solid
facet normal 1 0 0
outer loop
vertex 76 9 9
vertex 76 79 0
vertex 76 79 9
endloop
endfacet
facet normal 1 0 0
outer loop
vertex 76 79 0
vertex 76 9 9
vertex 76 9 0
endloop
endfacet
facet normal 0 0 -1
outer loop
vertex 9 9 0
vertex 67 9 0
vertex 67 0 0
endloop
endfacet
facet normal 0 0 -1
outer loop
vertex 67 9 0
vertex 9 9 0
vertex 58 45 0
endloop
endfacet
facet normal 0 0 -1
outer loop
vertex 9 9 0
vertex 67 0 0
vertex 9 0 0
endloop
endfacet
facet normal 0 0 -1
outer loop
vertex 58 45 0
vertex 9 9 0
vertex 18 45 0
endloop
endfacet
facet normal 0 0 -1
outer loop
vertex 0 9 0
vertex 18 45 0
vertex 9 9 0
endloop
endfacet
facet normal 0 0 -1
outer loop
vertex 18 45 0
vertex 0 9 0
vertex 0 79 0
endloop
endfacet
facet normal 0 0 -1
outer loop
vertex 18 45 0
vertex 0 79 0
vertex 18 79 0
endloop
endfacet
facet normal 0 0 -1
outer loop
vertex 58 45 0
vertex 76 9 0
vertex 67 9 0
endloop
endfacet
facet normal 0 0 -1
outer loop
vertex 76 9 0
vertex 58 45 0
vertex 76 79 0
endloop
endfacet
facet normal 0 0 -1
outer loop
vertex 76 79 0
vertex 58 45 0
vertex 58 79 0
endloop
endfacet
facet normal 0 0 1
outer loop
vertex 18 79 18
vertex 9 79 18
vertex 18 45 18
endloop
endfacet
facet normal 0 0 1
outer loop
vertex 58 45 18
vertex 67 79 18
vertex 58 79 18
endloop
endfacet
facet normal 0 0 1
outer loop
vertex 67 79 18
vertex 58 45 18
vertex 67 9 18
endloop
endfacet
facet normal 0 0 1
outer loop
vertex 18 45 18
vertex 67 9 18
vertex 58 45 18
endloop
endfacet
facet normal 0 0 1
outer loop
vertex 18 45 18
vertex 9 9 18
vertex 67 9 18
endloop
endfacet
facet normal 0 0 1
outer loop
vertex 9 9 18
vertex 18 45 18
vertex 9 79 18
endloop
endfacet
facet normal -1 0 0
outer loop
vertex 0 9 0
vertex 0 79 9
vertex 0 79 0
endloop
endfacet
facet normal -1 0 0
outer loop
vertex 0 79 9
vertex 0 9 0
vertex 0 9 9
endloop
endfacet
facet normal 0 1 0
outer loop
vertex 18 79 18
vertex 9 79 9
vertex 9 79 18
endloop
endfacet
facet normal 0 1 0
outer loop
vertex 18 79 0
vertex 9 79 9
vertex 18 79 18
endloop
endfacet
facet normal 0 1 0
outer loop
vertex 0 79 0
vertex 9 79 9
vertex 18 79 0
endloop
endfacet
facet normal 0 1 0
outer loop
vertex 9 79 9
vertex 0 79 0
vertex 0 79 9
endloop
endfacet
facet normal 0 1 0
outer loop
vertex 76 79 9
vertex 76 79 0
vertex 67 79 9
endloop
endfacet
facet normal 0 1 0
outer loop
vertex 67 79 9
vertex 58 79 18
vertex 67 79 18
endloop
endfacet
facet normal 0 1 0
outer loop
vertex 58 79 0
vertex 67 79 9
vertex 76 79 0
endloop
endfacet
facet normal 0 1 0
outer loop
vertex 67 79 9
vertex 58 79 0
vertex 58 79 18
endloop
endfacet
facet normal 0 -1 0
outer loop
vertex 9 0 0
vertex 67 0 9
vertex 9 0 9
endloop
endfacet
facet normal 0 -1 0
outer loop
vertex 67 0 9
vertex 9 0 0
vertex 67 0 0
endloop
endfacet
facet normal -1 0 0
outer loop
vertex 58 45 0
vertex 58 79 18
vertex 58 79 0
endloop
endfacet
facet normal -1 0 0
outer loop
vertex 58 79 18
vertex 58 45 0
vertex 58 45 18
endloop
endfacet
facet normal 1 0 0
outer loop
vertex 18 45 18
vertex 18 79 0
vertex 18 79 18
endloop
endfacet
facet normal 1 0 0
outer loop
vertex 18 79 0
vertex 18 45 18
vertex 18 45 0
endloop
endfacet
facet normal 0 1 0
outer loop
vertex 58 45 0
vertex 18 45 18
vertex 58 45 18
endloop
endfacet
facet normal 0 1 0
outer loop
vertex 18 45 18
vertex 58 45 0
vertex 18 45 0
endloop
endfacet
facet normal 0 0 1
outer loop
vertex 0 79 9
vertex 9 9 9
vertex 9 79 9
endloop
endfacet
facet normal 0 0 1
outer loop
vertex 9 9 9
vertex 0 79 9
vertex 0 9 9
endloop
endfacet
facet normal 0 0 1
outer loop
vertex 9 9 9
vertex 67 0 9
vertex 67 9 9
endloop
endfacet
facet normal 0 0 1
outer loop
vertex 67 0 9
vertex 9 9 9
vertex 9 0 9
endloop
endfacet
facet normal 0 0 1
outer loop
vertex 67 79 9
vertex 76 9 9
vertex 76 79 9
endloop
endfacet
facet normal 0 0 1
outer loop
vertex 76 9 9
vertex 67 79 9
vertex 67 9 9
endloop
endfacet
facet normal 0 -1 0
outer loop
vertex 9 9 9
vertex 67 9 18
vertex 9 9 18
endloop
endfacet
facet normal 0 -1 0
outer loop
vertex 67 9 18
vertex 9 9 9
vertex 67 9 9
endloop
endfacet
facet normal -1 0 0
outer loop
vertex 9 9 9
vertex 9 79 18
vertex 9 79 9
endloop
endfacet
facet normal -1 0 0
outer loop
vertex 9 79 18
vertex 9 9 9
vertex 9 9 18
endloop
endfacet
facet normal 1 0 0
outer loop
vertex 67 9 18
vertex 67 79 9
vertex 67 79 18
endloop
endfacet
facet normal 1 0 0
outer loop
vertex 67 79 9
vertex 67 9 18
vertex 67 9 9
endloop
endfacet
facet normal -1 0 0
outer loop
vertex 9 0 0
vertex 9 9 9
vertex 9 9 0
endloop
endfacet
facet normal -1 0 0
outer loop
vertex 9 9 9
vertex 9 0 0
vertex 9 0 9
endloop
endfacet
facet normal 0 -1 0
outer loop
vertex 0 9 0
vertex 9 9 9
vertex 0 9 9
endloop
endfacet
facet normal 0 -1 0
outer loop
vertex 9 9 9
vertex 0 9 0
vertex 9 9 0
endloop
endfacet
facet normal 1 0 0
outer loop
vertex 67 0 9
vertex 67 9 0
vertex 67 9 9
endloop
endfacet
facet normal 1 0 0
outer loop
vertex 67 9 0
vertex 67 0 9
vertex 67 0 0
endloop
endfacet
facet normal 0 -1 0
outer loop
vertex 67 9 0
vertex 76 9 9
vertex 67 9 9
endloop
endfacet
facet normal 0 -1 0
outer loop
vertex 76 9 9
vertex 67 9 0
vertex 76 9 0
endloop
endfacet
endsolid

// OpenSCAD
use <../minitub.scad>;

mirror([0, 0, 180]) translate([0, 0, -18])
    panel_back_inner();
